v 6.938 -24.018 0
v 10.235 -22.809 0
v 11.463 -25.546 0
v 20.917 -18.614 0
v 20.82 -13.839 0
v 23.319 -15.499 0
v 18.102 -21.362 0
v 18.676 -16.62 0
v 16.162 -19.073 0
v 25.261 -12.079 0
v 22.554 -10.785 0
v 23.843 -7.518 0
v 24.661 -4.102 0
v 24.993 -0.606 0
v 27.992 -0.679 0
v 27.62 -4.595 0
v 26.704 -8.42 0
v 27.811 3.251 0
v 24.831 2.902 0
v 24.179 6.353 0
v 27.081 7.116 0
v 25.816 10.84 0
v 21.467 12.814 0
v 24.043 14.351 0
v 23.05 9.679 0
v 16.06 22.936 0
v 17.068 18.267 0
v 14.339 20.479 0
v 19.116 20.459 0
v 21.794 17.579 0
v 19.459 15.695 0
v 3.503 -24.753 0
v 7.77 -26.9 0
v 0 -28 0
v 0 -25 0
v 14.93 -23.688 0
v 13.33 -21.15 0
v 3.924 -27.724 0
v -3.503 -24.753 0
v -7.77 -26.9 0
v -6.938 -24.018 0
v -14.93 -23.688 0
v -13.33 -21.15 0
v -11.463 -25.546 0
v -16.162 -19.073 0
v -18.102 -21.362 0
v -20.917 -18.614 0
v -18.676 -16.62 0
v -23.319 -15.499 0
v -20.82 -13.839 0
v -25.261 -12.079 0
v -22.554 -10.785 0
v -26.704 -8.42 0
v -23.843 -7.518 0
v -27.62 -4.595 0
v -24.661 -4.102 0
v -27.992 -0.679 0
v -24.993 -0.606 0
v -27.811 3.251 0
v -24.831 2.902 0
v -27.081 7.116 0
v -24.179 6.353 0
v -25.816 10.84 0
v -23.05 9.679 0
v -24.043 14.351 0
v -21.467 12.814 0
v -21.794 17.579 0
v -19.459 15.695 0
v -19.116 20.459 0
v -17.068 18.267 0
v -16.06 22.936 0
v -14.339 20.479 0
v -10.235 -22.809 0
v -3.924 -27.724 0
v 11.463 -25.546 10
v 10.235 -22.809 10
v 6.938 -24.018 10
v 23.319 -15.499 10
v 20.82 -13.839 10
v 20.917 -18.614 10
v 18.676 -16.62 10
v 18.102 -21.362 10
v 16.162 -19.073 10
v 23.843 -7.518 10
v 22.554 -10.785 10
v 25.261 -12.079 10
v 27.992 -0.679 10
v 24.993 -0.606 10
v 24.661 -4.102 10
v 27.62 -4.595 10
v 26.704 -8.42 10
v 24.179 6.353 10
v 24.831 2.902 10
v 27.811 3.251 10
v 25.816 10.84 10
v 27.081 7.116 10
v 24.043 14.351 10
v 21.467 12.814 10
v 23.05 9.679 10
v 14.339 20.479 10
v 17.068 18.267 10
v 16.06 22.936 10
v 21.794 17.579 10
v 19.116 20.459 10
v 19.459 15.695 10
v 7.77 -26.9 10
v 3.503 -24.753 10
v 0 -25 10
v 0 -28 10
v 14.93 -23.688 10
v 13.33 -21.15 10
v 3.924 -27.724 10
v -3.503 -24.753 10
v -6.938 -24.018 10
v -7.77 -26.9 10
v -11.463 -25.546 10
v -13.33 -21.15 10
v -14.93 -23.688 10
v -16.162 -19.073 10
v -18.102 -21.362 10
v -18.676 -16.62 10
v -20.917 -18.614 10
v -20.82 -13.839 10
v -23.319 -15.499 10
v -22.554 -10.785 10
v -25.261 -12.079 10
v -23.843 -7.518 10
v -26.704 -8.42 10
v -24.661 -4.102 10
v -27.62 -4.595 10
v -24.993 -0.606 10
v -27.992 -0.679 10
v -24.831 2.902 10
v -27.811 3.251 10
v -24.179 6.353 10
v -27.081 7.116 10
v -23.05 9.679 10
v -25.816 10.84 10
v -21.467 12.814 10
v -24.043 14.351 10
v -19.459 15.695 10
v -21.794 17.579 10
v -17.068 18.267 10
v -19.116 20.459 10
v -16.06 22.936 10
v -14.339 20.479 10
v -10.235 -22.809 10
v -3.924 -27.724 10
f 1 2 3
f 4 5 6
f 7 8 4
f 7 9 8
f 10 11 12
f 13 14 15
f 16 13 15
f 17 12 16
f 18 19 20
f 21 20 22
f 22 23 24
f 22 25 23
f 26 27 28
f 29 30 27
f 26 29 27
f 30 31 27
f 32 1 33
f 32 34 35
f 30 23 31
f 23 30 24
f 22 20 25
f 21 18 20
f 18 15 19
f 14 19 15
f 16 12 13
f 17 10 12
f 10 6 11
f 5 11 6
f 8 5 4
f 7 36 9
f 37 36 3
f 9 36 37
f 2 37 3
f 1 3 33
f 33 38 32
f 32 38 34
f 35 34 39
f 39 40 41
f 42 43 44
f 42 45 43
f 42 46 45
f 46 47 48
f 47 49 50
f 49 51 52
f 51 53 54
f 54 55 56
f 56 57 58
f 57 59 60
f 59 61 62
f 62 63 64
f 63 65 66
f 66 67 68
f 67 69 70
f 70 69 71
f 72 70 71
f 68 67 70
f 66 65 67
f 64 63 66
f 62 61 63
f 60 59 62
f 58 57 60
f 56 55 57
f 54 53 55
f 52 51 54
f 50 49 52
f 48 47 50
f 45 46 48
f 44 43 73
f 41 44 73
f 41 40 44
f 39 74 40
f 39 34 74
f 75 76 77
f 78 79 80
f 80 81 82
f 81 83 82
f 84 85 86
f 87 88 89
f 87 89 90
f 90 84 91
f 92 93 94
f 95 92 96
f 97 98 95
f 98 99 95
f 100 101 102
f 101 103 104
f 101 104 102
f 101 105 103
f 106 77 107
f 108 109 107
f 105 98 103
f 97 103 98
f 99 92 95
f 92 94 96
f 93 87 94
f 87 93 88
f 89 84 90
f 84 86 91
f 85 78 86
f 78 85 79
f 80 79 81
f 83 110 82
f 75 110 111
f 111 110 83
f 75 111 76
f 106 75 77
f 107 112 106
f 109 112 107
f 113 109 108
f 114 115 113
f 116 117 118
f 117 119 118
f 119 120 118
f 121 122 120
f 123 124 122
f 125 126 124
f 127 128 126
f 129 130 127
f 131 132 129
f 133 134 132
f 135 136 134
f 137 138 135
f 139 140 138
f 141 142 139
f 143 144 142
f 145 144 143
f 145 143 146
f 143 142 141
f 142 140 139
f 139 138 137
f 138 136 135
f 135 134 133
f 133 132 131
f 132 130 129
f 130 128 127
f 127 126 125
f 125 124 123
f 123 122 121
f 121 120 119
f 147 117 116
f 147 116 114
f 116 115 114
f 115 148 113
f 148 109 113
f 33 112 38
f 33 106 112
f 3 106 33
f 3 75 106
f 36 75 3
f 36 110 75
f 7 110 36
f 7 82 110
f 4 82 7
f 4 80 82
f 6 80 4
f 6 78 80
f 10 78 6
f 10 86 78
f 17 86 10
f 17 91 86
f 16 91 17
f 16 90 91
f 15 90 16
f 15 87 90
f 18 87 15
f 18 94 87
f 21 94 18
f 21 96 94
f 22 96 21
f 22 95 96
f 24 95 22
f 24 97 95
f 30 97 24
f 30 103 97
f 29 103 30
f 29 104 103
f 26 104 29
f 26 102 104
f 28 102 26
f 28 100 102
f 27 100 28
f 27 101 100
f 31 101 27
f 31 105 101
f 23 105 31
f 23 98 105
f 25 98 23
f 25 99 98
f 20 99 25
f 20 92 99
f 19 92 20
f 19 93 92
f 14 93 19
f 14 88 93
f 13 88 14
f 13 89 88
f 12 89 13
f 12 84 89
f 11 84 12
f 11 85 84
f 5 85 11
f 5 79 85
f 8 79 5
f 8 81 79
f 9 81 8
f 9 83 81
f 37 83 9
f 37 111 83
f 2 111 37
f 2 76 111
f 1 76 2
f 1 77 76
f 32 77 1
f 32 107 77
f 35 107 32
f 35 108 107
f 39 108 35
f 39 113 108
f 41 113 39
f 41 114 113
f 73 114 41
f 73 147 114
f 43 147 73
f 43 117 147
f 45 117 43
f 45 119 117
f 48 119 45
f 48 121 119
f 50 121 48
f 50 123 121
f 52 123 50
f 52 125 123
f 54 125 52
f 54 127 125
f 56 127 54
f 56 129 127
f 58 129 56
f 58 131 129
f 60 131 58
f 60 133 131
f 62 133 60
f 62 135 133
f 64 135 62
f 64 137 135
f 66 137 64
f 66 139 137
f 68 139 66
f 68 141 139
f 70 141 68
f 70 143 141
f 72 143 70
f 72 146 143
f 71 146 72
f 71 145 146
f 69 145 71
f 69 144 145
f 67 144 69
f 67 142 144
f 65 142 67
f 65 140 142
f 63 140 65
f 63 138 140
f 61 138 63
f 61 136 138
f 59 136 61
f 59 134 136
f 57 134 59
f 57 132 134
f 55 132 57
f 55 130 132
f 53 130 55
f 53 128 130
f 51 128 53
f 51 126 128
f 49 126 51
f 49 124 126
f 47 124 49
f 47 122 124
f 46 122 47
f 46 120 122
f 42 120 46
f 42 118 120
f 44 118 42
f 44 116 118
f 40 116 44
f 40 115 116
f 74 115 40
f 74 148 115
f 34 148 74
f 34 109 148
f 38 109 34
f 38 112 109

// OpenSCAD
$fn = 32;

// ----------------------------------------------------------------------
// Spring clip: 56 mm outside, 3 mm band, 70 degree opening
// ----------------------------------------------------------------------

// --- parameters (mm) ---
outer_r = 28;             // clip outside radius
inner_r = 25;             // clip bore radius
band = 3;                 // band thickness
clip_w = 10;              // clip width
opening = 70;             // opening angle

clip_profile = [[-16.06, 22.936], [-19.116, 20.459], [-21.794, 17.579], [-24.043, 14.351], [-25.816, 10.84], [-27.081, 7.116], [-27.811, 3.251], [-27.992, -0.679], [-27.62, -4.595], [-26.704, -8.42], [-25.261, -12.079], [-23.319, -15.499], [-20.917, -18.614], [-18.102, -21.362], [-14.93, -23.688], [-11.463, -25.546], [-7.77, -26.9], [-3.924, -27.724], [0, -28], [3.924, -27.724], [7.77, -26.9], [11.463, -25.546], [14.93, -23.688], [18.102, -21.362], [20.917, -18.614], [23.319, -15.499], [25.261, -12.079], [26.704, -8.42], [27.62, -4.595], [27.992, -0.679], [27.811, 3.251], [27.081, 7.116], [25.816, 10.84], [24.043, 14.351], [21.794, 17.579], [19.116, 20.459], [16.06, 22.936], [14.339, 20.479], [17.068, 18.267], [19.459, 15.695], [21.467, 12.814], [23.05, 9.679], [24.179, 6.353], [24.831, 2.902], [24.993, -0.606], [24.661, -4.102], [23.843, -7.518], [22.554, -10.785], [20.82, -13.839], [18.676, -16.62], [16.162, -19.073], [13.33, -21.15], [10.235, -22.809], [6.938, -24.018], [3.503, -24.753], [0, -25], [-3.503, -24.753], [-6.938, -24.018], [-10.235, -22.809], [-13.33, -21.15], [-16.162, -19.073], [-18.676, -16.62], [-20.82, -13.839], [-22.554, -10.785], [-23.843, -7.518], [-24.661, -4.102], [-24.993, -0.606], [-24.831, 2.902], [-24.179, 6.353], [-23.05, 9.679], [-21.467, 12.814], [-19.459, 15.695], [-17.068, 18.267], [-14.339, 20.479]];

difference() {
  union() {
    linear_extrude(height = clip_w) polygon(clip_profile);
  }
}
